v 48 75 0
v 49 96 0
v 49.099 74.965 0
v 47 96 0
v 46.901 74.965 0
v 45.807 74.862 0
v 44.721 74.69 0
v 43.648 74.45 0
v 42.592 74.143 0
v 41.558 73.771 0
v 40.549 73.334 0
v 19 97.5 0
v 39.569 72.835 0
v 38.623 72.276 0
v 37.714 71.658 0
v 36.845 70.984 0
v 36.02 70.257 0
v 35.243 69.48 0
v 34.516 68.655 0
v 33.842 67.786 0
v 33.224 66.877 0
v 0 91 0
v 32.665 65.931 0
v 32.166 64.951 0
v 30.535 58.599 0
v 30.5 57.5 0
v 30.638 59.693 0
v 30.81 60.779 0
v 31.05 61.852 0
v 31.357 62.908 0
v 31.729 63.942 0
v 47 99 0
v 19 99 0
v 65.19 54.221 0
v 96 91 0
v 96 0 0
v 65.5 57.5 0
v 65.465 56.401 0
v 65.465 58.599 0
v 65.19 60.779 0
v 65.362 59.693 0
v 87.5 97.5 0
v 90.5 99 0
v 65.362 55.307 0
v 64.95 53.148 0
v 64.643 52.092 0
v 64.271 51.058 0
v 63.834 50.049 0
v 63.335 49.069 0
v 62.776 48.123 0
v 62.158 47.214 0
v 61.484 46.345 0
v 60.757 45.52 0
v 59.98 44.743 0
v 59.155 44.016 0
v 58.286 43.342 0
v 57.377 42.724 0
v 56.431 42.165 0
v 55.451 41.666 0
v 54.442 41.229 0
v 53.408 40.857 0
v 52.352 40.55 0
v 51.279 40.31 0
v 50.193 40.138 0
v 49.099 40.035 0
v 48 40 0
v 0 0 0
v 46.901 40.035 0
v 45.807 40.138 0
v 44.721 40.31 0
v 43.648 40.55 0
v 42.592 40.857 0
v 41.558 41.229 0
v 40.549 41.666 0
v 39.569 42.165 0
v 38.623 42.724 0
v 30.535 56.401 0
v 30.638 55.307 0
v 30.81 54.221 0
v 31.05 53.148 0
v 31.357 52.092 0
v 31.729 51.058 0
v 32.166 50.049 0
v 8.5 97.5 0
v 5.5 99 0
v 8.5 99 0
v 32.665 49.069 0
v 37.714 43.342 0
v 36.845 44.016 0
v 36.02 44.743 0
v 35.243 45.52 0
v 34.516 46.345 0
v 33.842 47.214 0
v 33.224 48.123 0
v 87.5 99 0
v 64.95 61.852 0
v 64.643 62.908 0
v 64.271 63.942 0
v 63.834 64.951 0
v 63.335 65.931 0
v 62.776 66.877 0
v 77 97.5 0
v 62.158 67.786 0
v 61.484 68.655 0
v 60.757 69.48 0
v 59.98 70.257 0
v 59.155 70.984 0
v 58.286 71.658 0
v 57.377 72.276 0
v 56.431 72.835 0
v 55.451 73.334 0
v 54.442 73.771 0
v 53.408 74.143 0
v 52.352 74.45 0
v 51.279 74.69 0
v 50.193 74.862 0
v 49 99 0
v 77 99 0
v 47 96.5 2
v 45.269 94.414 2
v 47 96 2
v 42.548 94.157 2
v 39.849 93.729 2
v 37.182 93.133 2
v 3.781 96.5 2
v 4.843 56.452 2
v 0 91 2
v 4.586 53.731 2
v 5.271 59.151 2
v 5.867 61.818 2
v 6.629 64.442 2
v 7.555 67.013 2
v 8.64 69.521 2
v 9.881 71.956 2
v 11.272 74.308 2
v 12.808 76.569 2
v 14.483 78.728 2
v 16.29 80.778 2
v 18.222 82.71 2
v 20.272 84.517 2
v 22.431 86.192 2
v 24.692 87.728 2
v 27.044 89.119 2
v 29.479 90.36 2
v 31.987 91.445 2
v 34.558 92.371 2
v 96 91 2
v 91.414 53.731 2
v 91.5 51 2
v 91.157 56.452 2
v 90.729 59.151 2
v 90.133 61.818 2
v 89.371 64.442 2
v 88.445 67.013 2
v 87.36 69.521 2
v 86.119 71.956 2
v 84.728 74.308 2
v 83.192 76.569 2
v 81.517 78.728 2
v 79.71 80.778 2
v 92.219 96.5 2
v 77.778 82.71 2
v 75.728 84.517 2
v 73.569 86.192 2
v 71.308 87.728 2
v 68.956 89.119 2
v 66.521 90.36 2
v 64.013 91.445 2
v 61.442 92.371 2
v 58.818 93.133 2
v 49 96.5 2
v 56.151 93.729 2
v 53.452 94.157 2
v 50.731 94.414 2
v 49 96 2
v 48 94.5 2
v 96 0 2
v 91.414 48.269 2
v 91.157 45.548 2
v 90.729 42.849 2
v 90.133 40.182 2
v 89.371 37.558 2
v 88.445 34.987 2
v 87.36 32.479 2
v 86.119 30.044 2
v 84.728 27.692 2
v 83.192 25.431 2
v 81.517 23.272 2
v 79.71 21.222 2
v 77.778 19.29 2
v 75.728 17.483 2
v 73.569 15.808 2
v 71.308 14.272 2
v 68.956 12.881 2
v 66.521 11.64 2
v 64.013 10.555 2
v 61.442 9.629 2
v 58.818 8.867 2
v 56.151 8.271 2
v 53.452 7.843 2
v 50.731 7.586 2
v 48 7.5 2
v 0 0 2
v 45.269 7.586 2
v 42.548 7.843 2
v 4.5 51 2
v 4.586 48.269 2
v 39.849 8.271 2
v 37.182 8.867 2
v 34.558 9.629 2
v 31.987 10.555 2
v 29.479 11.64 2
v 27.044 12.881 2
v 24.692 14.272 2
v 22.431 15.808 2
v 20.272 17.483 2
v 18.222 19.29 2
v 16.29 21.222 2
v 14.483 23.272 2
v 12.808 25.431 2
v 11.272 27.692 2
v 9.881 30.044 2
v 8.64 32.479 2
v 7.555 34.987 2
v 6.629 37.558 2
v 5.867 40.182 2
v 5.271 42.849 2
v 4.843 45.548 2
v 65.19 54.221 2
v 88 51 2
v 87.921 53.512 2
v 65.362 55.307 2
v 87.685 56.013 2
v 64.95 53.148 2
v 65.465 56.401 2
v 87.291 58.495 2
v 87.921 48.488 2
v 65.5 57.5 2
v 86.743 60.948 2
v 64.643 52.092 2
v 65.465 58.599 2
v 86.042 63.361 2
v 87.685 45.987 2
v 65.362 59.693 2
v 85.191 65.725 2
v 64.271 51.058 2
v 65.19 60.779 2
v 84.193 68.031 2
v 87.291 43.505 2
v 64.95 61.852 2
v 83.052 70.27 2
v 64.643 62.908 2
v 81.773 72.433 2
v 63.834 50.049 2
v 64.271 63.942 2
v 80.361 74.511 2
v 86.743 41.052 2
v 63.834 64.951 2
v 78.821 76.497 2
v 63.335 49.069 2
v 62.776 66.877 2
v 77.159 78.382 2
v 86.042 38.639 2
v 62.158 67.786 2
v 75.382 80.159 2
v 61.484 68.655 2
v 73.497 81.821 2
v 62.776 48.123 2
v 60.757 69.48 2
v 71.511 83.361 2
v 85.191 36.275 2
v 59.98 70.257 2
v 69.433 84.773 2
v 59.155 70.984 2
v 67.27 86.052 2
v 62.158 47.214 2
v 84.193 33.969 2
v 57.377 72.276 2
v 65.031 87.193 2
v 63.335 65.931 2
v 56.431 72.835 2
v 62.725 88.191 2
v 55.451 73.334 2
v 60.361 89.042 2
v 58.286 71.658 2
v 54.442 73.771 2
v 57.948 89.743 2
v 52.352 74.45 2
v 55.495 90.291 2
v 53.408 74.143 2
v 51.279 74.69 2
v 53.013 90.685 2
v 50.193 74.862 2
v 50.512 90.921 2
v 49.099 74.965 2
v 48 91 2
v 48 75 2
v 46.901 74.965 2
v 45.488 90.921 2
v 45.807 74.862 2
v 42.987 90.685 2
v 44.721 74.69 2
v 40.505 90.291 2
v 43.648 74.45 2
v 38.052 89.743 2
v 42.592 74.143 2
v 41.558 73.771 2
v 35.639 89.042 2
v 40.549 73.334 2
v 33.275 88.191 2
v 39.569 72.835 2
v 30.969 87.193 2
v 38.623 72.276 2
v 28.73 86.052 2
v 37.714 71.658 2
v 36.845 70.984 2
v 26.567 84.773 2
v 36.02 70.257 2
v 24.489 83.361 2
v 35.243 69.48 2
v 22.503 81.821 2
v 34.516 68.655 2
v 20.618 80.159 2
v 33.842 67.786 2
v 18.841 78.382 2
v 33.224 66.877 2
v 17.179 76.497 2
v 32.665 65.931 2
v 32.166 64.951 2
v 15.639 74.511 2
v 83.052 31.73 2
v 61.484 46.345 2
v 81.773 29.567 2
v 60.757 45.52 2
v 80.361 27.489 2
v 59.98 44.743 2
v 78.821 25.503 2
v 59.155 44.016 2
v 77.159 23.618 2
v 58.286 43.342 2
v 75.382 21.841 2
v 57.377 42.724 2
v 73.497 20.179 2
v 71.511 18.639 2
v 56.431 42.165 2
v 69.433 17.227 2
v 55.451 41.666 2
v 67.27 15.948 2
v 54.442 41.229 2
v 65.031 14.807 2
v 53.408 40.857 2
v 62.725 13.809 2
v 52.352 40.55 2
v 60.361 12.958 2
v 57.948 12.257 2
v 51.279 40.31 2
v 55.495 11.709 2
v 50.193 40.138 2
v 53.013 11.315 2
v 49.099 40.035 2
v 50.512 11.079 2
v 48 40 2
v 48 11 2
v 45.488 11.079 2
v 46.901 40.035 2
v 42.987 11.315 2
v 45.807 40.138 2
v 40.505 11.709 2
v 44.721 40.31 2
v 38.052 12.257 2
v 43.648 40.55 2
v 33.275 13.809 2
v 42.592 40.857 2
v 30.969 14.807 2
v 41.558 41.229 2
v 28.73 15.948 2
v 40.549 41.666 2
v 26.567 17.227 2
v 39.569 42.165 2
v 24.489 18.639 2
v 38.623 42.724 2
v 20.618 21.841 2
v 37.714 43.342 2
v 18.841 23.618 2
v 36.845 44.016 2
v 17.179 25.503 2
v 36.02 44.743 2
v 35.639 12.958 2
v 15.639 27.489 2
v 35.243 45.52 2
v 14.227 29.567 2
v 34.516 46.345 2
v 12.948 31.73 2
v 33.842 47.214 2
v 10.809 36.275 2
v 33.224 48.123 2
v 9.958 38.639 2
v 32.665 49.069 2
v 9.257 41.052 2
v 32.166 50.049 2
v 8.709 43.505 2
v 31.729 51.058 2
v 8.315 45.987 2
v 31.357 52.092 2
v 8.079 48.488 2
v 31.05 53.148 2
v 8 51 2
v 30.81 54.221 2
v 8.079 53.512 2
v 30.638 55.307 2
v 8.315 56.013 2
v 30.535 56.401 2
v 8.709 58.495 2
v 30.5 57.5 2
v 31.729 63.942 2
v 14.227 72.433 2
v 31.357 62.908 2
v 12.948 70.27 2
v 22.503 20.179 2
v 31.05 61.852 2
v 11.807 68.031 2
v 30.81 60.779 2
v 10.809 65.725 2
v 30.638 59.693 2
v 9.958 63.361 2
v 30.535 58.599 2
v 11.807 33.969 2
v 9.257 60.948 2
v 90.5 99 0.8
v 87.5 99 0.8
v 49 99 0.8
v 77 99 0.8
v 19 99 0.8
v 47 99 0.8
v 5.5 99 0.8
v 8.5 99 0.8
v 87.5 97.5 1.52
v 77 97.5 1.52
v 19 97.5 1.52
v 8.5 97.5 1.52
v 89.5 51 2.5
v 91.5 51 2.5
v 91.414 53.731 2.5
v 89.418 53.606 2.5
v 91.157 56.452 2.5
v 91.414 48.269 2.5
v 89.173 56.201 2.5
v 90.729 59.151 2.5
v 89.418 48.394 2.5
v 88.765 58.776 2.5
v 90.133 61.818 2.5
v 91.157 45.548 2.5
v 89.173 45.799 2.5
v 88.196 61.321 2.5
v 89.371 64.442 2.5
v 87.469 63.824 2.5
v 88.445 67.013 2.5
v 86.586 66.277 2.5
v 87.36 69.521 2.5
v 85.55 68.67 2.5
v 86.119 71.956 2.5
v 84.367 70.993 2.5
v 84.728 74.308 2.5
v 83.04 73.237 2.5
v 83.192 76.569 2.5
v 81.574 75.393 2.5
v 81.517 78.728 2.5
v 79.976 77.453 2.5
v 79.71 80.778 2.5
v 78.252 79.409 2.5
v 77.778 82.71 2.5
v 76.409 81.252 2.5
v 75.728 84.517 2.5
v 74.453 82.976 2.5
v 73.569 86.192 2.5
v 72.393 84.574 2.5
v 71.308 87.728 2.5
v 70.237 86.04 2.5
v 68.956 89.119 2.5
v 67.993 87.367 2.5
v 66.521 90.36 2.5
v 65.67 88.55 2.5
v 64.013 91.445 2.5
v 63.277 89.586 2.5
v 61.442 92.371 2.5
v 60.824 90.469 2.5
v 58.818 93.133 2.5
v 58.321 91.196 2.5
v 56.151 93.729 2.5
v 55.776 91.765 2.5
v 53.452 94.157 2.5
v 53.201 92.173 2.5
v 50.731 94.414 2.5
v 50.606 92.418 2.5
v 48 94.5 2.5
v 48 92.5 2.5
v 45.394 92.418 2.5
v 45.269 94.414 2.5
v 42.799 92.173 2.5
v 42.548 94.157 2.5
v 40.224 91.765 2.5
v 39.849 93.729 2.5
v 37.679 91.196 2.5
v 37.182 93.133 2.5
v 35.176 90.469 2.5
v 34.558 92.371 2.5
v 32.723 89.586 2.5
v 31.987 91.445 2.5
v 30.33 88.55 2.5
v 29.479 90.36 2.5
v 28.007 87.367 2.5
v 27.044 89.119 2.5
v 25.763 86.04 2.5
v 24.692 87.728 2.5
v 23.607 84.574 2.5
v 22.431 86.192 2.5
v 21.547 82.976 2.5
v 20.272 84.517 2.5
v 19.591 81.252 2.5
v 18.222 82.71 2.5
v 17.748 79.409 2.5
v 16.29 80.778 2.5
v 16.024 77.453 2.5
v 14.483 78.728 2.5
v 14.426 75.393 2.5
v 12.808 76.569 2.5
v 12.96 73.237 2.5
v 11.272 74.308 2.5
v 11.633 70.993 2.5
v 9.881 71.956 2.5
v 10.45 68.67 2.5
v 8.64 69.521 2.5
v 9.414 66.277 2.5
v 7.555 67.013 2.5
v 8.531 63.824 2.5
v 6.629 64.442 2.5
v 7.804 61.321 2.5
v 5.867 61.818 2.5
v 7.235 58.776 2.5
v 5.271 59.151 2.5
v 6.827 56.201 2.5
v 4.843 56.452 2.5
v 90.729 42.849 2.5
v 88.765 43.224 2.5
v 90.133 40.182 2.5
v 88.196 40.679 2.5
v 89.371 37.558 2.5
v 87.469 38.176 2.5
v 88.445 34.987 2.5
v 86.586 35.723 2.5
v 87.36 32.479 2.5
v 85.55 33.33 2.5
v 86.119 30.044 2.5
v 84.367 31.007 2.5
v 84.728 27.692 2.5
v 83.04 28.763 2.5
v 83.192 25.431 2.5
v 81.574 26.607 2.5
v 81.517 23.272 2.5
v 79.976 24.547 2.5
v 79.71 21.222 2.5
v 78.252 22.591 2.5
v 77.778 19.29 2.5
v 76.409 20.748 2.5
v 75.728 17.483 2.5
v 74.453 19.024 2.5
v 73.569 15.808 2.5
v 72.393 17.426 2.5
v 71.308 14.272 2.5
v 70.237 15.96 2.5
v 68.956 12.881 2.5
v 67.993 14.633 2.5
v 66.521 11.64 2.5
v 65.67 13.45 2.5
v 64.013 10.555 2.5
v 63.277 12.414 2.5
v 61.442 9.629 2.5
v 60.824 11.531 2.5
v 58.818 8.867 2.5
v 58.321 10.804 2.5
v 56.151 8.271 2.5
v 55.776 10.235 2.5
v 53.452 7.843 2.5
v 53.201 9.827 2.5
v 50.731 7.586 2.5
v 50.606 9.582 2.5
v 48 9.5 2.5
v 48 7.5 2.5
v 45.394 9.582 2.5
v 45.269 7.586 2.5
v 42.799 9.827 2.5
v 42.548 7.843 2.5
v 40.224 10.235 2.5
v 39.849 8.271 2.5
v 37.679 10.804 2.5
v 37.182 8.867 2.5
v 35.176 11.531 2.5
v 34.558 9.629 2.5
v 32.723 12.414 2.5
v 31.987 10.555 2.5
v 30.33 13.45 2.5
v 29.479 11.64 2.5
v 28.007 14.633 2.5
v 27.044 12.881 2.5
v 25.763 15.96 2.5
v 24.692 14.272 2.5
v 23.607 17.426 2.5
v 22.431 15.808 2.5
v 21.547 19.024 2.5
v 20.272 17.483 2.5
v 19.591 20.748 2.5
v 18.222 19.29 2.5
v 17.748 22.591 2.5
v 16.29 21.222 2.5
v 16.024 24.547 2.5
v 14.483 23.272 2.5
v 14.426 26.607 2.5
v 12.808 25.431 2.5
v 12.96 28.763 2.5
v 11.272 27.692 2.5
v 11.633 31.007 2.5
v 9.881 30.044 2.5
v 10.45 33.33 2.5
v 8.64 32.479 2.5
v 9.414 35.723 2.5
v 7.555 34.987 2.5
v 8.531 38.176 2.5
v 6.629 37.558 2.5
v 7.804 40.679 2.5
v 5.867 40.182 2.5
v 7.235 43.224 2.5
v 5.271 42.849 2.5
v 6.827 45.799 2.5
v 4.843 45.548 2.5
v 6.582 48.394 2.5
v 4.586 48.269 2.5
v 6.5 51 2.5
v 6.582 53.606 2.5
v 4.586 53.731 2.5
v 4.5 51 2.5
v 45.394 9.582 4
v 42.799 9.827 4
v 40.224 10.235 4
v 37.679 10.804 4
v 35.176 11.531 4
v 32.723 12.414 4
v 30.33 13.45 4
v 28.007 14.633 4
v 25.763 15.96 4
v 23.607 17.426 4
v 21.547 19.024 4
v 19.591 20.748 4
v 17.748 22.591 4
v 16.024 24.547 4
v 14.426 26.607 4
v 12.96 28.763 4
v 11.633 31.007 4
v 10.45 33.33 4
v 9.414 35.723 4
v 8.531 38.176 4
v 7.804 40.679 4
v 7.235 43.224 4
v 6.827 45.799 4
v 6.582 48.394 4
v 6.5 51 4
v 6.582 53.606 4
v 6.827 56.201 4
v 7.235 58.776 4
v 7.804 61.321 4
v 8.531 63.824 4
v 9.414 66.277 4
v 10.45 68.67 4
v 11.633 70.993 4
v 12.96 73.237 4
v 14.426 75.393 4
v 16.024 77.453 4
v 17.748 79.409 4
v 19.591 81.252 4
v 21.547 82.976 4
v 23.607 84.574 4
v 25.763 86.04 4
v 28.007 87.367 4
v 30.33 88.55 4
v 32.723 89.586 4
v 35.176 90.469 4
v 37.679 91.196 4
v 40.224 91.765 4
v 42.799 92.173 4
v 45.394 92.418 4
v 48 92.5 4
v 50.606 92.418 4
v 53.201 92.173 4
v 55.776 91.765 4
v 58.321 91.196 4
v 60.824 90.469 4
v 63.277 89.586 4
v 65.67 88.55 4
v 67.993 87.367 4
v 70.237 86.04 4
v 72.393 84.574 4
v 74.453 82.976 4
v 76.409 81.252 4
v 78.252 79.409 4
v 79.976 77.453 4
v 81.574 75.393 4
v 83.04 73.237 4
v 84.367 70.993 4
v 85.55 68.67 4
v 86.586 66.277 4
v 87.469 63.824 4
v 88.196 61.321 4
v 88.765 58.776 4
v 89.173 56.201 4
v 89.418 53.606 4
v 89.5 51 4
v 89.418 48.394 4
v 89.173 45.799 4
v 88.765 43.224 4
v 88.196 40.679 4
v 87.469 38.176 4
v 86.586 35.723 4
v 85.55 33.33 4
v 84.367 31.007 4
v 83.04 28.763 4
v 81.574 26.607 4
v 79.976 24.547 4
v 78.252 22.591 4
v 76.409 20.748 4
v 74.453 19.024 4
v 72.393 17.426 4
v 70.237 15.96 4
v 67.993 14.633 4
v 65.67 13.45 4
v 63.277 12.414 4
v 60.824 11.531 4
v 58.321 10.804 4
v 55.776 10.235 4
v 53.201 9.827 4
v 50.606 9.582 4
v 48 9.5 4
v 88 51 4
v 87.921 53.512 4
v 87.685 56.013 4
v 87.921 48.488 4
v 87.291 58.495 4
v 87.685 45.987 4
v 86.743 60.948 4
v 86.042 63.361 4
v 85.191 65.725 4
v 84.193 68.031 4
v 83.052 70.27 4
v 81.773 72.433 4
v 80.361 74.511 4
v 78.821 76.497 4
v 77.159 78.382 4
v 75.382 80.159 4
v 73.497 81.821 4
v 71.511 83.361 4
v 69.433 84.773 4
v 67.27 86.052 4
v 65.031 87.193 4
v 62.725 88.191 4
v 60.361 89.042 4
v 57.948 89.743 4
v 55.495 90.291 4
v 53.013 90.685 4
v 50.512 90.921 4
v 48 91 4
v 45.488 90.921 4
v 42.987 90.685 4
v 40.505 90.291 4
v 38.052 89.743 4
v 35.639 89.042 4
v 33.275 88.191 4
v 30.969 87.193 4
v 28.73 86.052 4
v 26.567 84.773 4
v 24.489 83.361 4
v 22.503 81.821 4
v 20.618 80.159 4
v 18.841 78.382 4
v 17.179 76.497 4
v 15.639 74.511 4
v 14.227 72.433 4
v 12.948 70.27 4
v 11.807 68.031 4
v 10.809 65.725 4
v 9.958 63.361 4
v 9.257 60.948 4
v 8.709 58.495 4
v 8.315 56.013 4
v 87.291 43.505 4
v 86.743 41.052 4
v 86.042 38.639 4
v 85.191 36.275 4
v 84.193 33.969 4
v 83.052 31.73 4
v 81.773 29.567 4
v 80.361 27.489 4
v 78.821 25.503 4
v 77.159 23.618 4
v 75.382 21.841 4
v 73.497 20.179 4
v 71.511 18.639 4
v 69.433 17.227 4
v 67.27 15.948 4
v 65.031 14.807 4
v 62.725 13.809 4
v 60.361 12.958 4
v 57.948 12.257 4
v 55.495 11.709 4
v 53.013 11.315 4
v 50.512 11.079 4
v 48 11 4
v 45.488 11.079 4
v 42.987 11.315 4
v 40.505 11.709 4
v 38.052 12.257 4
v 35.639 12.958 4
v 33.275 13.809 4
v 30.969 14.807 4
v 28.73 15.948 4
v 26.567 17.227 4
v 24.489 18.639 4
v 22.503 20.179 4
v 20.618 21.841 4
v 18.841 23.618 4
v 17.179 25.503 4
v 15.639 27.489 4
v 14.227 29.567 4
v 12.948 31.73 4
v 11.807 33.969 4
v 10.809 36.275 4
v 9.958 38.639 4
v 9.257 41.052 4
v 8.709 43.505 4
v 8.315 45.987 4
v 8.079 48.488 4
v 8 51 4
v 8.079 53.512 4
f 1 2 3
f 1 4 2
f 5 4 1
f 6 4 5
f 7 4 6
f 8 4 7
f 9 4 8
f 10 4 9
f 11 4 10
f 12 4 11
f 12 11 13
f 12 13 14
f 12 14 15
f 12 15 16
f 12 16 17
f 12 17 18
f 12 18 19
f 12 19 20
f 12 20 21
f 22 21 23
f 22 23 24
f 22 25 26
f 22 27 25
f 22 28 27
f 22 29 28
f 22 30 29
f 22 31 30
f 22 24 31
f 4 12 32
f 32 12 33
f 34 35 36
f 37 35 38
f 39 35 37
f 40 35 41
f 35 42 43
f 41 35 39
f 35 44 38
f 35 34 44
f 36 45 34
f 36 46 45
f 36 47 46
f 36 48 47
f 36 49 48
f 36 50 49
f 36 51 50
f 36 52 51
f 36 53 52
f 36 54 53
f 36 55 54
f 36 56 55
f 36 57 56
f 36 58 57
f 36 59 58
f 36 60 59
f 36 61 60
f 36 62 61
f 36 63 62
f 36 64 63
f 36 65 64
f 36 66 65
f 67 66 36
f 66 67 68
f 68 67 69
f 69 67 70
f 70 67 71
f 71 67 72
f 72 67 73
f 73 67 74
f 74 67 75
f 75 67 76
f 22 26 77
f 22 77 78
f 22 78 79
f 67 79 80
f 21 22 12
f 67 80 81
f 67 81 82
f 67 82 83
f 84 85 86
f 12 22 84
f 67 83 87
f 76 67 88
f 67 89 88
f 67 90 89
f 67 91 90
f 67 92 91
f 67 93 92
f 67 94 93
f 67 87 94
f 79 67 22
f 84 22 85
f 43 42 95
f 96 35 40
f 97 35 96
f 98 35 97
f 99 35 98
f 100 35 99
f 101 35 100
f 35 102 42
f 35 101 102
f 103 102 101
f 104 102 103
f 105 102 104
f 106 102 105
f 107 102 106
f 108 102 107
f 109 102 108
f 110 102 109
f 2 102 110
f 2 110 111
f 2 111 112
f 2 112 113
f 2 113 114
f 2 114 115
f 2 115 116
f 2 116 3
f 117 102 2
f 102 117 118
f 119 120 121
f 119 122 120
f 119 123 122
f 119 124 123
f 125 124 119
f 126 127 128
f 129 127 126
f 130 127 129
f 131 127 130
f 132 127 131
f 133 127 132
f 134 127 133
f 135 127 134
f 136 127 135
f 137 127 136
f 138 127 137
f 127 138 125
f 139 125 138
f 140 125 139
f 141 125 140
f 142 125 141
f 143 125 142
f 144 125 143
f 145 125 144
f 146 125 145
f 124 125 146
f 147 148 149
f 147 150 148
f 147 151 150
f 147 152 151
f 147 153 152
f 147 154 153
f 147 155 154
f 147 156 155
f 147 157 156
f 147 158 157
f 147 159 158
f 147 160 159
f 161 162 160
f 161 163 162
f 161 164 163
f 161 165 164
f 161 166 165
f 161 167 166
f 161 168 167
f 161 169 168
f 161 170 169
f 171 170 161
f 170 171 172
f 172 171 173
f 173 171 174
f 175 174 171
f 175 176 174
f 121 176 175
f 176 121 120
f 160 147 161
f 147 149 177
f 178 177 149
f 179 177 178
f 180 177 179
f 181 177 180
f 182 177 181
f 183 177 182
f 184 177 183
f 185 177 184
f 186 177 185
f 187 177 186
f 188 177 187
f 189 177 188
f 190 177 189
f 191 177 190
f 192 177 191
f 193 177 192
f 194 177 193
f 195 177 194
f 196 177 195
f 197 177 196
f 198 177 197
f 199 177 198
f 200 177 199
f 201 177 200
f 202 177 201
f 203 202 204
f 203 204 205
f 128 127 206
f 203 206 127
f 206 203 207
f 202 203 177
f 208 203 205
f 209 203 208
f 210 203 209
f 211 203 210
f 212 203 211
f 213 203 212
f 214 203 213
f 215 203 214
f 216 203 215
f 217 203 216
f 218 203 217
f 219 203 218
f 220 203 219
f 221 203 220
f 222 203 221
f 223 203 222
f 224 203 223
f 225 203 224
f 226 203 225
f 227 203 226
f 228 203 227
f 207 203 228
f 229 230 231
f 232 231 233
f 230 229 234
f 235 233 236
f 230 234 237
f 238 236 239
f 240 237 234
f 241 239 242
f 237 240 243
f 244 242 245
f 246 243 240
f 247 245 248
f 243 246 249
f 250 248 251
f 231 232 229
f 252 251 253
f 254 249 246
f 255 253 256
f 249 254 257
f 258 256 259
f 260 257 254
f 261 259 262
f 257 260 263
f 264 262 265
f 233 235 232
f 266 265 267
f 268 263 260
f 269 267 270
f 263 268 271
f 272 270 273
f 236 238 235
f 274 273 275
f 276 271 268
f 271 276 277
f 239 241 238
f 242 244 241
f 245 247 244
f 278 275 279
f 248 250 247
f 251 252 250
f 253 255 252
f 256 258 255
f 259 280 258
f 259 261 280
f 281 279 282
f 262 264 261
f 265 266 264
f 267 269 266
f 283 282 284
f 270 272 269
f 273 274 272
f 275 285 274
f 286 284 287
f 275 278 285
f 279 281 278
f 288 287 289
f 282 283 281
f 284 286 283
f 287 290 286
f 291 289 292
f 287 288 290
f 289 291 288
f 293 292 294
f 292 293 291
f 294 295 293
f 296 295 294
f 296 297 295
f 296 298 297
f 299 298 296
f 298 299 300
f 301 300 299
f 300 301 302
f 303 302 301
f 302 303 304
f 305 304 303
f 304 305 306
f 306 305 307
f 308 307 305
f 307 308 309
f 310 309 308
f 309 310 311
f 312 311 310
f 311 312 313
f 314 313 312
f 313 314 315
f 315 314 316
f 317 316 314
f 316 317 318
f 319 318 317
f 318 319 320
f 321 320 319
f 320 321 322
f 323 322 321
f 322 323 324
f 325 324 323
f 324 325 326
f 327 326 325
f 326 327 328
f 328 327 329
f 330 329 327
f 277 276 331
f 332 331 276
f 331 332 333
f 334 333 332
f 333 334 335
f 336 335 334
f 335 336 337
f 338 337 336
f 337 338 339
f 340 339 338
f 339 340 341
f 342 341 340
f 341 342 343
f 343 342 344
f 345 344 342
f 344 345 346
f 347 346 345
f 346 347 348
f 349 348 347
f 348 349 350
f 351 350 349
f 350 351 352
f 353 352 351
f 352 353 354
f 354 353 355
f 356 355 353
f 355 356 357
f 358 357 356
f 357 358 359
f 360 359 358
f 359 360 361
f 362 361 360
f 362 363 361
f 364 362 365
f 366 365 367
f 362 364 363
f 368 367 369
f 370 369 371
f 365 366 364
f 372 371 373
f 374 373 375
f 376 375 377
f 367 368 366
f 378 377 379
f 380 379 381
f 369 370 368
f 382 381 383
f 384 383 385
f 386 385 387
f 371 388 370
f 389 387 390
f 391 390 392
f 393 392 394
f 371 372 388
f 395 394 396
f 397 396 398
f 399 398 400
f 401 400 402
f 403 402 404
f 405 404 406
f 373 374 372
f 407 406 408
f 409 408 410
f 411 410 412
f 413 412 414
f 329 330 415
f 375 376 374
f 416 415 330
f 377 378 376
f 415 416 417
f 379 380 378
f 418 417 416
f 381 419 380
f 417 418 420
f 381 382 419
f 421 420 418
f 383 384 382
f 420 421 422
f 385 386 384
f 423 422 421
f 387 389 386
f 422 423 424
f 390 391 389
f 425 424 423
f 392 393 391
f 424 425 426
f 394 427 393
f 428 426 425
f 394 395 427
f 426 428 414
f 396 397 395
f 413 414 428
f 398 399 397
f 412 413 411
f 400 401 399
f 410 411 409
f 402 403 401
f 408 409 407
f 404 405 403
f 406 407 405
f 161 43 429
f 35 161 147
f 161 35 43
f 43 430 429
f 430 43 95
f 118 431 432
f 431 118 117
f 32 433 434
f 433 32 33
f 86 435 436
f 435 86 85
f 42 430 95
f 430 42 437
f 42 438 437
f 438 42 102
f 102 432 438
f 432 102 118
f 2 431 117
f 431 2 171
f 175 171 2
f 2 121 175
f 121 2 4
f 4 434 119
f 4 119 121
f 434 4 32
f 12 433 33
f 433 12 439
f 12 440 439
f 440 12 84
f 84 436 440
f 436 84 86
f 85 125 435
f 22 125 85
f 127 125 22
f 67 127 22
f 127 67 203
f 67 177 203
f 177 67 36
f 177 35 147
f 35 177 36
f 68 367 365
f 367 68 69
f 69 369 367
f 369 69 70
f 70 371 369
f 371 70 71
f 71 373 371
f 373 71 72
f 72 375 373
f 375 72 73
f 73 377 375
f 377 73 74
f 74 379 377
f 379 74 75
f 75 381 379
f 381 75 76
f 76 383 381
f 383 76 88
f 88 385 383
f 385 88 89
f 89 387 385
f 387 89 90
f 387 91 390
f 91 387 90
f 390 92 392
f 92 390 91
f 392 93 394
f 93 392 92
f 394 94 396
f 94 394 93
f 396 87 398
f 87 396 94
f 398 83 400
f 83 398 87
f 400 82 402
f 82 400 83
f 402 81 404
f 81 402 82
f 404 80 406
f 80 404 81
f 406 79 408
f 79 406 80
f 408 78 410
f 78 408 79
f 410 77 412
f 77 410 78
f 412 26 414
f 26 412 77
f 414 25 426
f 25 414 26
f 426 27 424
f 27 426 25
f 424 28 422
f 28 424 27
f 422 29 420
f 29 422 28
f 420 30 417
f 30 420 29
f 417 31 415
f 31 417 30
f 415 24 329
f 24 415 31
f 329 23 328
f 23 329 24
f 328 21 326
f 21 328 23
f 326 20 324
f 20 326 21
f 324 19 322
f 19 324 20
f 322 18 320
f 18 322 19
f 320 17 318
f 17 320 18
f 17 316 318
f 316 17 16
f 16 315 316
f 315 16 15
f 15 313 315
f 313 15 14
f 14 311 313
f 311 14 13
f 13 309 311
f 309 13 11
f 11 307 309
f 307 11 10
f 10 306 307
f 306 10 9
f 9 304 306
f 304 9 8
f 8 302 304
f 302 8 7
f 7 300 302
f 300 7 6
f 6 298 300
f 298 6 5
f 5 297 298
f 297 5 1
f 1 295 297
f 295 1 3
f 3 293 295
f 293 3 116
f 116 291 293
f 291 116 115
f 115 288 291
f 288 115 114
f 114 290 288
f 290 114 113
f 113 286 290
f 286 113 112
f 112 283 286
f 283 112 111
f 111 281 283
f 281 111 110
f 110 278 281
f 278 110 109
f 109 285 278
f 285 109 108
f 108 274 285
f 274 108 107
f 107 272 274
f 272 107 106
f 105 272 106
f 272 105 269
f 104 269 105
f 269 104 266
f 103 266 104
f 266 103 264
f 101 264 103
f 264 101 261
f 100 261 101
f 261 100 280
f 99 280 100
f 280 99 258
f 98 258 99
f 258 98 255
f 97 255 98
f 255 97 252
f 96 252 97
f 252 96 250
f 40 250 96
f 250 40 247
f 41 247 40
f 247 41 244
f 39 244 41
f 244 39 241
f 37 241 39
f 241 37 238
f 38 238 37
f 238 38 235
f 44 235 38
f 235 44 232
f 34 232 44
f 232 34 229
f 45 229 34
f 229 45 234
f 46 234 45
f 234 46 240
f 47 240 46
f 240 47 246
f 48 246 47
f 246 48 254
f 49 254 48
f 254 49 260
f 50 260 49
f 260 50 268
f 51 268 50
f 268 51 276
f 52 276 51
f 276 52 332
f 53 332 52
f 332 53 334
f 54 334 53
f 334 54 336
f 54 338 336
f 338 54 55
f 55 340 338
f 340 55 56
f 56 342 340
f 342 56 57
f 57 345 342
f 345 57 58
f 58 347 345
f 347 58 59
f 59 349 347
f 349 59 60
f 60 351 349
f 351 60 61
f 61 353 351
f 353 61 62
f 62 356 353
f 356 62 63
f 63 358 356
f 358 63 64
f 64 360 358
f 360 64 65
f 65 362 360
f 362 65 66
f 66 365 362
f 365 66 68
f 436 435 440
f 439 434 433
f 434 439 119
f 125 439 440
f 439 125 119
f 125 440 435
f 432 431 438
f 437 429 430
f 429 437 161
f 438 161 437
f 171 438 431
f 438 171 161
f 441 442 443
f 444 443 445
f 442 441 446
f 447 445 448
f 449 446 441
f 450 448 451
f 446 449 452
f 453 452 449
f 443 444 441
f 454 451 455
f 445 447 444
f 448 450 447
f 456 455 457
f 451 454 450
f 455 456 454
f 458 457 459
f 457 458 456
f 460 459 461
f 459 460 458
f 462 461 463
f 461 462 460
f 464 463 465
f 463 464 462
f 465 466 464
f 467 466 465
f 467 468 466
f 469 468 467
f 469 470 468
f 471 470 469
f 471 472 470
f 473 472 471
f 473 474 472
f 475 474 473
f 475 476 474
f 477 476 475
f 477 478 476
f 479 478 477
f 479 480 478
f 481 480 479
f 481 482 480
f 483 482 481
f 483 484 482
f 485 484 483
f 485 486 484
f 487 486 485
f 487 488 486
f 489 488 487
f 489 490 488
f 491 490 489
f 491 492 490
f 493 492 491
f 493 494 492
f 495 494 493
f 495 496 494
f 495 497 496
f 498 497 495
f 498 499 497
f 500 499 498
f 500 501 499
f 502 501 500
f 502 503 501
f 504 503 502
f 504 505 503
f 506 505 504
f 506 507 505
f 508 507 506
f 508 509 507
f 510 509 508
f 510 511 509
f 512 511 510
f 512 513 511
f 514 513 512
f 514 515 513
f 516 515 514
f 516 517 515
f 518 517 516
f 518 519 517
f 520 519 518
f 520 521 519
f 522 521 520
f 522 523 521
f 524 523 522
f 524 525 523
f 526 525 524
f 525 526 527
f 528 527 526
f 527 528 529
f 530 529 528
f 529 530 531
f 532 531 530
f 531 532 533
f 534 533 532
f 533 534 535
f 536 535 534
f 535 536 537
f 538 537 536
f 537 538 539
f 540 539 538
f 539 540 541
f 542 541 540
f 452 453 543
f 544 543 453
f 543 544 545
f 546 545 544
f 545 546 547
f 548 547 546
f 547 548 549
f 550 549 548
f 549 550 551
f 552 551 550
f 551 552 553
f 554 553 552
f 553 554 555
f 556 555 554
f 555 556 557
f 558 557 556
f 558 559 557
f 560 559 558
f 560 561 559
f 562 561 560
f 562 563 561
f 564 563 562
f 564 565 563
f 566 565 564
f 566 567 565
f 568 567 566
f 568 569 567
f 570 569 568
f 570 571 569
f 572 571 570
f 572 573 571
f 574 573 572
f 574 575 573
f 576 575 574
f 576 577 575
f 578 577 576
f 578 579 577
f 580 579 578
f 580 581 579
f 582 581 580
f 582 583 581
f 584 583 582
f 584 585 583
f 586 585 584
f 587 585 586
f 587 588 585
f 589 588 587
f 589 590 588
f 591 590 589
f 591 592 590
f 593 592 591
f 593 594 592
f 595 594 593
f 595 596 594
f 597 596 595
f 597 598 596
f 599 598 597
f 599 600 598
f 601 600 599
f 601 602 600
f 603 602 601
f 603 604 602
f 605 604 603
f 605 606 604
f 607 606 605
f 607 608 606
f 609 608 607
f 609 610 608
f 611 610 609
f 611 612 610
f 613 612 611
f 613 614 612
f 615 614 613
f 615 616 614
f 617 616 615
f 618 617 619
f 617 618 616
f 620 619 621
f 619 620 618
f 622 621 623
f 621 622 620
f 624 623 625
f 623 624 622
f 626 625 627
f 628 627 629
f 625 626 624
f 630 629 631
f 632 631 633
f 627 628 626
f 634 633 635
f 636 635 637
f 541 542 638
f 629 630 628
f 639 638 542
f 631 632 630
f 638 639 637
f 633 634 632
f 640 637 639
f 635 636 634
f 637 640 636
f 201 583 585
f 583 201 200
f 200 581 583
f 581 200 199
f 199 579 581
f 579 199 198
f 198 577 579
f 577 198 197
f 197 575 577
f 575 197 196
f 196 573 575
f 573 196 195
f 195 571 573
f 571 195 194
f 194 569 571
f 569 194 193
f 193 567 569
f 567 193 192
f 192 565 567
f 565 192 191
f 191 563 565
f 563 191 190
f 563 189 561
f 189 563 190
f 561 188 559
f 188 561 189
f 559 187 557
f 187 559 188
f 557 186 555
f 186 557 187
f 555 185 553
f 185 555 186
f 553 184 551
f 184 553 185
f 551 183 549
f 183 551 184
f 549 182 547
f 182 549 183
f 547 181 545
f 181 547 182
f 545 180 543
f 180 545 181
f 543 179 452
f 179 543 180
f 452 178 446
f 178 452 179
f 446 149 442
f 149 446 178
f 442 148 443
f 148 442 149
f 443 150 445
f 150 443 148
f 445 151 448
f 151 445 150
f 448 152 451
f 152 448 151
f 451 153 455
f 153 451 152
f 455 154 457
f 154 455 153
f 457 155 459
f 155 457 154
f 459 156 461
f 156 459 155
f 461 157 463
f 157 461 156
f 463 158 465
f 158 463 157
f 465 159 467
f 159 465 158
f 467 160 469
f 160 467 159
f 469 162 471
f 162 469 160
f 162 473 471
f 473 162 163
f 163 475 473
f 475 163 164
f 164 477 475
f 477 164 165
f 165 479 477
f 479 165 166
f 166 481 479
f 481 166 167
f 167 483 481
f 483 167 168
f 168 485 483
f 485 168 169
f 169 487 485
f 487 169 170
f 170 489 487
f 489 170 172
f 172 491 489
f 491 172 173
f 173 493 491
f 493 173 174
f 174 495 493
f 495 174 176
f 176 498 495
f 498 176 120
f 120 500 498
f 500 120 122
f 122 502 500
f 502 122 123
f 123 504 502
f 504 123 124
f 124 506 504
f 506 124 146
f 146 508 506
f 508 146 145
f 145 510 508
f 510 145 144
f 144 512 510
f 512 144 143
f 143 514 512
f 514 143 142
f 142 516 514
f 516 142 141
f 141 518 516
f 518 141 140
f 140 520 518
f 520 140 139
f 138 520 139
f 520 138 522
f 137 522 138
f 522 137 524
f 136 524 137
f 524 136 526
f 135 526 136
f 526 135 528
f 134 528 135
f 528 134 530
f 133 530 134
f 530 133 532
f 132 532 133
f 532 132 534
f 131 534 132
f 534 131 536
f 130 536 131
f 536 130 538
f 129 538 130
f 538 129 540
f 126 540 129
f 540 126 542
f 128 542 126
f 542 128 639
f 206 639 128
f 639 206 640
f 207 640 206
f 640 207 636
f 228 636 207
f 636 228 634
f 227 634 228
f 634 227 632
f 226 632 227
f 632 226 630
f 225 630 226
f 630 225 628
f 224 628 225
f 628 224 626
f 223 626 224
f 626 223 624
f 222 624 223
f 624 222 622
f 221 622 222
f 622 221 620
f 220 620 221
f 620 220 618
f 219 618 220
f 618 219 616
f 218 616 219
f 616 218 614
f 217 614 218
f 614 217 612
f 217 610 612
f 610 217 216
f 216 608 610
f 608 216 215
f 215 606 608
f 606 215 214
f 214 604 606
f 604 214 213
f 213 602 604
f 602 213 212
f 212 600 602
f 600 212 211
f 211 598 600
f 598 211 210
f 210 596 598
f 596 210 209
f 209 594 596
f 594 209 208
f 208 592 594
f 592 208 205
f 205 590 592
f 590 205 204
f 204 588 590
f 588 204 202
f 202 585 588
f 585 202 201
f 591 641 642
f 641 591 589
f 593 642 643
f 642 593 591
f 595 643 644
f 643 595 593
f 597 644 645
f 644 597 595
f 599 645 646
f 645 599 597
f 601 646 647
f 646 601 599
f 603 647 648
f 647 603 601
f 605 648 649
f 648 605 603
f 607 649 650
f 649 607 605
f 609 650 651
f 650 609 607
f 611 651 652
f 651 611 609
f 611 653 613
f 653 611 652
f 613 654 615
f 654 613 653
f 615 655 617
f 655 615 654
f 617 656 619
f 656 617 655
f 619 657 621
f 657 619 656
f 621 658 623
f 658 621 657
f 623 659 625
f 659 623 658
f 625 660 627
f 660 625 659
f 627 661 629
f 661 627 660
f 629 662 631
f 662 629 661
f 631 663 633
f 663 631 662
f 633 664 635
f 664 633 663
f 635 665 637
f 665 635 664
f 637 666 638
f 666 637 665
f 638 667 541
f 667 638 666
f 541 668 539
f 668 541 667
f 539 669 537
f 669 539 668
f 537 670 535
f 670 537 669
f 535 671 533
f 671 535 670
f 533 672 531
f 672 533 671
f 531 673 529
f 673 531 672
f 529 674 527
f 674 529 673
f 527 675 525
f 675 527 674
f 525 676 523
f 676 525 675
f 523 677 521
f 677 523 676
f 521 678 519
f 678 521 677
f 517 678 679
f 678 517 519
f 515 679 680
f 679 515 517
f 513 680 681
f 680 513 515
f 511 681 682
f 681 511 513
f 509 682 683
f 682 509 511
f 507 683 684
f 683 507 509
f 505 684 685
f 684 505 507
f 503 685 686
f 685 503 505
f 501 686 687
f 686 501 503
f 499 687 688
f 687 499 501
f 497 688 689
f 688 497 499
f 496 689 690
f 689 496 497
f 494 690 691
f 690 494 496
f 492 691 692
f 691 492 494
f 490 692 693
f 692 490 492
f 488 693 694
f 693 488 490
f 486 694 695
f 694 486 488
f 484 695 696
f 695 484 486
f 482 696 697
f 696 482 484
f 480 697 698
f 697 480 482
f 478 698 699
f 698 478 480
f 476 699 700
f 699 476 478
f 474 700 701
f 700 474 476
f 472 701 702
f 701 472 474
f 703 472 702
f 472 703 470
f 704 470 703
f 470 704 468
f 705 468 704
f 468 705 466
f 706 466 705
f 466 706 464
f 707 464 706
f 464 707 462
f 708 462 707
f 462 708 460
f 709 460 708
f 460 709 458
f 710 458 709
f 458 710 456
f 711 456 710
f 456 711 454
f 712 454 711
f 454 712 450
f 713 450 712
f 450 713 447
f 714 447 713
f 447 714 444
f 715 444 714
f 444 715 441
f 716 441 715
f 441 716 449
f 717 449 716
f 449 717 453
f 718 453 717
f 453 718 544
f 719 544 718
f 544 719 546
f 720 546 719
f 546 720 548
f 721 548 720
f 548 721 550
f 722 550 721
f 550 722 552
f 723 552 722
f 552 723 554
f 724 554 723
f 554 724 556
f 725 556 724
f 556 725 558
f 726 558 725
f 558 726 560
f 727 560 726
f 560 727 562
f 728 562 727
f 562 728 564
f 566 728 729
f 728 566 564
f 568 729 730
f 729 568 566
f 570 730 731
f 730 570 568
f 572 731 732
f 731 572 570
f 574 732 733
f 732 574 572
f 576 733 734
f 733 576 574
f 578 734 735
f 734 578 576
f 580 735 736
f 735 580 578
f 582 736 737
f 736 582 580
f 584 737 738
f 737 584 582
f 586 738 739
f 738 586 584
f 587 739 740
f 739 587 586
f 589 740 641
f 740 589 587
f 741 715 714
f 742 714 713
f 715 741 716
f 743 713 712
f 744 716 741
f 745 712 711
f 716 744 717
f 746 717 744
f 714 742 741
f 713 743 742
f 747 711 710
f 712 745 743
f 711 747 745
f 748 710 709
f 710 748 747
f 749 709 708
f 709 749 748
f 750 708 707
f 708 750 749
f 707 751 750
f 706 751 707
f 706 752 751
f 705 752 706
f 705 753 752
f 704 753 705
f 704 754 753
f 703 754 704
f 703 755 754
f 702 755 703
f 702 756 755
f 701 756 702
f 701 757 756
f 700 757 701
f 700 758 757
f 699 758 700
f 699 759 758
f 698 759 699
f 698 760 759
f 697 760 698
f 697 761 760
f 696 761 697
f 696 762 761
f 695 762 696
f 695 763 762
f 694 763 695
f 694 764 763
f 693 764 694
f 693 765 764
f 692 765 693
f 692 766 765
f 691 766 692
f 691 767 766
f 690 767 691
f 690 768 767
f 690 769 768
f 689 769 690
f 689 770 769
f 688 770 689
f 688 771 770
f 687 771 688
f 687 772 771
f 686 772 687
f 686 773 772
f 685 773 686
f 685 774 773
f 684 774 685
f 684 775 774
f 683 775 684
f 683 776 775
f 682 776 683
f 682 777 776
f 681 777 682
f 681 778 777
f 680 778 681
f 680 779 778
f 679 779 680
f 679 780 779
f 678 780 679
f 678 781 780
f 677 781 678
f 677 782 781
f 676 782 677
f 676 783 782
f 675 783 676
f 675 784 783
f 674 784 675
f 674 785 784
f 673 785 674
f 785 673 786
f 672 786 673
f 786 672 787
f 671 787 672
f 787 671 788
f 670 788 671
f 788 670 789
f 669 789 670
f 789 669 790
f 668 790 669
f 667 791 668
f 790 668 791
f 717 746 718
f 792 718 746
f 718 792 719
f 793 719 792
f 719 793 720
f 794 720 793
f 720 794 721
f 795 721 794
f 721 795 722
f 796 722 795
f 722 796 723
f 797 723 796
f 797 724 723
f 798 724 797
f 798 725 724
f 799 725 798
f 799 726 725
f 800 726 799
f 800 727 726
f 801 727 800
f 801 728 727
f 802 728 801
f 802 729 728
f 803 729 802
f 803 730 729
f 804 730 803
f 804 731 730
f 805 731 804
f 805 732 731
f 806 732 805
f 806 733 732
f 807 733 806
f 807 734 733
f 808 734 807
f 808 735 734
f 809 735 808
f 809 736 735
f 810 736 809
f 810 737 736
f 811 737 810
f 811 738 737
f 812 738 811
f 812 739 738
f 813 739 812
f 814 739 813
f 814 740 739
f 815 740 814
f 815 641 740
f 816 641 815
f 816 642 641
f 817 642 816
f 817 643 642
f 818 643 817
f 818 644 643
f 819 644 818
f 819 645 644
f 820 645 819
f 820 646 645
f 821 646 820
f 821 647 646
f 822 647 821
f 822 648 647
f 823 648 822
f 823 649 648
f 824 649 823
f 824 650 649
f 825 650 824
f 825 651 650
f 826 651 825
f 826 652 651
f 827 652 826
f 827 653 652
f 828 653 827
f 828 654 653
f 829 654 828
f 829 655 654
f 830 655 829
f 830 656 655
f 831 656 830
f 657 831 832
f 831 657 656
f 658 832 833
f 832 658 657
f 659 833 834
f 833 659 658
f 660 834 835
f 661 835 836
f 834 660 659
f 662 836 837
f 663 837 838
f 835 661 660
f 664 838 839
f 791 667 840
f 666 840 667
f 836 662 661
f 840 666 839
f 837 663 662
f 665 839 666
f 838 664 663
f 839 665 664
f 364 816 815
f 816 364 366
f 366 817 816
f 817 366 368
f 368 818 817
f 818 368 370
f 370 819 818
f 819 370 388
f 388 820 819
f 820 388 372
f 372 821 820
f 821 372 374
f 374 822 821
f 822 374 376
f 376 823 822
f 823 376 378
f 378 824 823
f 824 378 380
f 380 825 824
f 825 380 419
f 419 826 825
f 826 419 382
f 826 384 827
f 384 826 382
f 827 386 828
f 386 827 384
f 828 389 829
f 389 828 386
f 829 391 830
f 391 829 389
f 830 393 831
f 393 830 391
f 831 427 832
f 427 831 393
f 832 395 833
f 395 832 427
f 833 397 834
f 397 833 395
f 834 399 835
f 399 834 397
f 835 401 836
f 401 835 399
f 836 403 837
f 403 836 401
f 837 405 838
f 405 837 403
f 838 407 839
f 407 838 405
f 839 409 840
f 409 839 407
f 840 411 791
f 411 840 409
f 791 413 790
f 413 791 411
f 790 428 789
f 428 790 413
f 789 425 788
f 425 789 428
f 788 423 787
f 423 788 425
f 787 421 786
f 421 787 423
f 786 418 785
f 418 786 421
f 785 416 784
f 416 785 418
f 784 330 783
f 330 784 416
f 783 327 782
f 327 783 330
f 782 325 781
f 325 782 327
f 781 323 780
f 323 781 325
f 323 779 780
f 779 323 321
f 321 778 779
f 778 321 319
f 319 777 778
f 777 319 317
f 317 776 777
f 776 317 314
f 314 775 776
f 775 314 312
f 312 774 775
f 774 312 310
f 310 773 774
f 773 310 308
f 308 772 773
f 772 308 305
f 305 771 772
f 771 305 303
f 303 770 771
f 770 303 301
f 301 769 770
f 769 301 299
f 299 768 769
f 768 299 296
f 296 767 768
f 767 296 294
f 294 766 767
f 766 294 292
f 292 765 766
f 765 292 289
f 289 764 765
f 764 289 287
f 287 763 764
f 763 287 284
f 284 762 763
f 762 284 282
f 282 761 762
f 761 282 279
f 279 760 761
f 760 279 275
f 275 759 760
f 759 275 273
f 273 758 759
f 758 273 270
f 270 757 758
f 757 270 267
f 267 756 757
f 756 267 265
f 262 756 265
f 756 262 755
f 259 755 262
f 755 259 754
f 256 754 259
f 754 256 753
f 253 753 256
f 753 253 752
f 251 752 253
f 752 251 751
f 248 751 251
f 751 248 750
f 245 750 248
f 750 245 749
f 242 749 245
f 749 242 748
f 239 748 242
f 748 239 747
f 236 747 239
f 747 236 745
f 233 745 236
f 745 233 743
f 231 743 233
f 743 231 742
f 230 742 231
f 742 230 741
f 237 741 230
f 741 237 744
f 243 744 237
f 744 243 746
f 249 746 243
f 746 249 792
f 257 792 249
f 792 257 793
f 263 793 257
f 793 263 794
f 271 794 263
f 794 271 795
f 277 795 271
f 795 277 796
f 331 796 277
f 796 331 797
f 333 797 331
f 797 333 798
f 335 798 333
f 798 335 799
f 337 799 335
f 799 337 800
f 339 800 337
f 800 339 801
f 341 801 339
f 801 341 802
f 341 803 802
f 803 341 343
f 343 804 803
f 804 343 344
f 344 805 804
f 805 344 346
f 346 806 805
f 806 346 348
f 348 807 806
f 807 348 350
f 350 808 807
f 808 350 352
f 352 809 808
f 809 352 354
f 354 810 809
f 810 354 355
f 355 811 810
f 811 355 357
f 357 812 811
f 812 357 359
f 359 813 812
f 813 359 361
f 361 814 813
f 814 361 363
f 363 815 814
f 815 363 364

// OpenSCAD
$fn = 100;

// 補助のリングを出すかどうかの制御
is_ling = true;
//is_ling = false;

union() {
    difference() {
        linear_extrude(height = 2) {
            difference() {
                polygon(
                    points=[
                        [0, 0],
                        [96, 0],
                        [96, 99 - 8],
                        [96-5.5, 99],
                        [96 - 8.5, 99],
                        [96 - 8.5, 99 - 1.5],
                        [96 - 8.5 - 10.5, 99 - 1.5],
                        [77, 99],
                        [49, 99],
                        [49, 99 - 3],
                        [47, 99 - 3],
                        [47, 99],
                        [8.5 + 10.5, 99],
                        [8.5 + 10.5, 99 - 1.5],
                        [8.5, 99 - 1.5],
                        [8.5, 99],
                        [5.5, 99],
                        [0, 99 - 8]
                    ]
                );
                // 穴の直径を実物を元にもう一度調節する
                translate([96 / 2, 57.5]) {
                    circle(35 / 2);
                };
            }
        };
        translate([0, 99, 0.8]){
            rotate(a=[180, 270, 0]) {
                linear_extrude(height = 99) {
                    polygon([
                        [0,0],
                        [2 - 0.8, 2.5],
                        [2, 2.5],
                        [2, 0],
                        [2, -1],
                        [2 - 0.8, -1],
                        [2 - 0.8, 0]
                    ]);
                }
            }
        };
    }
    translate([96 / 2, (96 - 9) / 2 + 7.5]) {
        if (is_ling) {
            linear_extrude(height= 2.5) {
                difference() {
                    circle(r = (96 - 9) / 2, center = true);
                    circle(r = (96 - 13) / 2, center = true);
                }
            }
        }
    };

    translate([96 / 2, (96 - 9) / 2 + 7.5]) {
        if (is_ling) {
            linear_extrude(height= 4) {
                difference() {
                    circle(r = (96 - 13) / 2, center = true);
                    circle(r = (96 - 16) / 2, center = true);
                }
            }
        }
    };
}
